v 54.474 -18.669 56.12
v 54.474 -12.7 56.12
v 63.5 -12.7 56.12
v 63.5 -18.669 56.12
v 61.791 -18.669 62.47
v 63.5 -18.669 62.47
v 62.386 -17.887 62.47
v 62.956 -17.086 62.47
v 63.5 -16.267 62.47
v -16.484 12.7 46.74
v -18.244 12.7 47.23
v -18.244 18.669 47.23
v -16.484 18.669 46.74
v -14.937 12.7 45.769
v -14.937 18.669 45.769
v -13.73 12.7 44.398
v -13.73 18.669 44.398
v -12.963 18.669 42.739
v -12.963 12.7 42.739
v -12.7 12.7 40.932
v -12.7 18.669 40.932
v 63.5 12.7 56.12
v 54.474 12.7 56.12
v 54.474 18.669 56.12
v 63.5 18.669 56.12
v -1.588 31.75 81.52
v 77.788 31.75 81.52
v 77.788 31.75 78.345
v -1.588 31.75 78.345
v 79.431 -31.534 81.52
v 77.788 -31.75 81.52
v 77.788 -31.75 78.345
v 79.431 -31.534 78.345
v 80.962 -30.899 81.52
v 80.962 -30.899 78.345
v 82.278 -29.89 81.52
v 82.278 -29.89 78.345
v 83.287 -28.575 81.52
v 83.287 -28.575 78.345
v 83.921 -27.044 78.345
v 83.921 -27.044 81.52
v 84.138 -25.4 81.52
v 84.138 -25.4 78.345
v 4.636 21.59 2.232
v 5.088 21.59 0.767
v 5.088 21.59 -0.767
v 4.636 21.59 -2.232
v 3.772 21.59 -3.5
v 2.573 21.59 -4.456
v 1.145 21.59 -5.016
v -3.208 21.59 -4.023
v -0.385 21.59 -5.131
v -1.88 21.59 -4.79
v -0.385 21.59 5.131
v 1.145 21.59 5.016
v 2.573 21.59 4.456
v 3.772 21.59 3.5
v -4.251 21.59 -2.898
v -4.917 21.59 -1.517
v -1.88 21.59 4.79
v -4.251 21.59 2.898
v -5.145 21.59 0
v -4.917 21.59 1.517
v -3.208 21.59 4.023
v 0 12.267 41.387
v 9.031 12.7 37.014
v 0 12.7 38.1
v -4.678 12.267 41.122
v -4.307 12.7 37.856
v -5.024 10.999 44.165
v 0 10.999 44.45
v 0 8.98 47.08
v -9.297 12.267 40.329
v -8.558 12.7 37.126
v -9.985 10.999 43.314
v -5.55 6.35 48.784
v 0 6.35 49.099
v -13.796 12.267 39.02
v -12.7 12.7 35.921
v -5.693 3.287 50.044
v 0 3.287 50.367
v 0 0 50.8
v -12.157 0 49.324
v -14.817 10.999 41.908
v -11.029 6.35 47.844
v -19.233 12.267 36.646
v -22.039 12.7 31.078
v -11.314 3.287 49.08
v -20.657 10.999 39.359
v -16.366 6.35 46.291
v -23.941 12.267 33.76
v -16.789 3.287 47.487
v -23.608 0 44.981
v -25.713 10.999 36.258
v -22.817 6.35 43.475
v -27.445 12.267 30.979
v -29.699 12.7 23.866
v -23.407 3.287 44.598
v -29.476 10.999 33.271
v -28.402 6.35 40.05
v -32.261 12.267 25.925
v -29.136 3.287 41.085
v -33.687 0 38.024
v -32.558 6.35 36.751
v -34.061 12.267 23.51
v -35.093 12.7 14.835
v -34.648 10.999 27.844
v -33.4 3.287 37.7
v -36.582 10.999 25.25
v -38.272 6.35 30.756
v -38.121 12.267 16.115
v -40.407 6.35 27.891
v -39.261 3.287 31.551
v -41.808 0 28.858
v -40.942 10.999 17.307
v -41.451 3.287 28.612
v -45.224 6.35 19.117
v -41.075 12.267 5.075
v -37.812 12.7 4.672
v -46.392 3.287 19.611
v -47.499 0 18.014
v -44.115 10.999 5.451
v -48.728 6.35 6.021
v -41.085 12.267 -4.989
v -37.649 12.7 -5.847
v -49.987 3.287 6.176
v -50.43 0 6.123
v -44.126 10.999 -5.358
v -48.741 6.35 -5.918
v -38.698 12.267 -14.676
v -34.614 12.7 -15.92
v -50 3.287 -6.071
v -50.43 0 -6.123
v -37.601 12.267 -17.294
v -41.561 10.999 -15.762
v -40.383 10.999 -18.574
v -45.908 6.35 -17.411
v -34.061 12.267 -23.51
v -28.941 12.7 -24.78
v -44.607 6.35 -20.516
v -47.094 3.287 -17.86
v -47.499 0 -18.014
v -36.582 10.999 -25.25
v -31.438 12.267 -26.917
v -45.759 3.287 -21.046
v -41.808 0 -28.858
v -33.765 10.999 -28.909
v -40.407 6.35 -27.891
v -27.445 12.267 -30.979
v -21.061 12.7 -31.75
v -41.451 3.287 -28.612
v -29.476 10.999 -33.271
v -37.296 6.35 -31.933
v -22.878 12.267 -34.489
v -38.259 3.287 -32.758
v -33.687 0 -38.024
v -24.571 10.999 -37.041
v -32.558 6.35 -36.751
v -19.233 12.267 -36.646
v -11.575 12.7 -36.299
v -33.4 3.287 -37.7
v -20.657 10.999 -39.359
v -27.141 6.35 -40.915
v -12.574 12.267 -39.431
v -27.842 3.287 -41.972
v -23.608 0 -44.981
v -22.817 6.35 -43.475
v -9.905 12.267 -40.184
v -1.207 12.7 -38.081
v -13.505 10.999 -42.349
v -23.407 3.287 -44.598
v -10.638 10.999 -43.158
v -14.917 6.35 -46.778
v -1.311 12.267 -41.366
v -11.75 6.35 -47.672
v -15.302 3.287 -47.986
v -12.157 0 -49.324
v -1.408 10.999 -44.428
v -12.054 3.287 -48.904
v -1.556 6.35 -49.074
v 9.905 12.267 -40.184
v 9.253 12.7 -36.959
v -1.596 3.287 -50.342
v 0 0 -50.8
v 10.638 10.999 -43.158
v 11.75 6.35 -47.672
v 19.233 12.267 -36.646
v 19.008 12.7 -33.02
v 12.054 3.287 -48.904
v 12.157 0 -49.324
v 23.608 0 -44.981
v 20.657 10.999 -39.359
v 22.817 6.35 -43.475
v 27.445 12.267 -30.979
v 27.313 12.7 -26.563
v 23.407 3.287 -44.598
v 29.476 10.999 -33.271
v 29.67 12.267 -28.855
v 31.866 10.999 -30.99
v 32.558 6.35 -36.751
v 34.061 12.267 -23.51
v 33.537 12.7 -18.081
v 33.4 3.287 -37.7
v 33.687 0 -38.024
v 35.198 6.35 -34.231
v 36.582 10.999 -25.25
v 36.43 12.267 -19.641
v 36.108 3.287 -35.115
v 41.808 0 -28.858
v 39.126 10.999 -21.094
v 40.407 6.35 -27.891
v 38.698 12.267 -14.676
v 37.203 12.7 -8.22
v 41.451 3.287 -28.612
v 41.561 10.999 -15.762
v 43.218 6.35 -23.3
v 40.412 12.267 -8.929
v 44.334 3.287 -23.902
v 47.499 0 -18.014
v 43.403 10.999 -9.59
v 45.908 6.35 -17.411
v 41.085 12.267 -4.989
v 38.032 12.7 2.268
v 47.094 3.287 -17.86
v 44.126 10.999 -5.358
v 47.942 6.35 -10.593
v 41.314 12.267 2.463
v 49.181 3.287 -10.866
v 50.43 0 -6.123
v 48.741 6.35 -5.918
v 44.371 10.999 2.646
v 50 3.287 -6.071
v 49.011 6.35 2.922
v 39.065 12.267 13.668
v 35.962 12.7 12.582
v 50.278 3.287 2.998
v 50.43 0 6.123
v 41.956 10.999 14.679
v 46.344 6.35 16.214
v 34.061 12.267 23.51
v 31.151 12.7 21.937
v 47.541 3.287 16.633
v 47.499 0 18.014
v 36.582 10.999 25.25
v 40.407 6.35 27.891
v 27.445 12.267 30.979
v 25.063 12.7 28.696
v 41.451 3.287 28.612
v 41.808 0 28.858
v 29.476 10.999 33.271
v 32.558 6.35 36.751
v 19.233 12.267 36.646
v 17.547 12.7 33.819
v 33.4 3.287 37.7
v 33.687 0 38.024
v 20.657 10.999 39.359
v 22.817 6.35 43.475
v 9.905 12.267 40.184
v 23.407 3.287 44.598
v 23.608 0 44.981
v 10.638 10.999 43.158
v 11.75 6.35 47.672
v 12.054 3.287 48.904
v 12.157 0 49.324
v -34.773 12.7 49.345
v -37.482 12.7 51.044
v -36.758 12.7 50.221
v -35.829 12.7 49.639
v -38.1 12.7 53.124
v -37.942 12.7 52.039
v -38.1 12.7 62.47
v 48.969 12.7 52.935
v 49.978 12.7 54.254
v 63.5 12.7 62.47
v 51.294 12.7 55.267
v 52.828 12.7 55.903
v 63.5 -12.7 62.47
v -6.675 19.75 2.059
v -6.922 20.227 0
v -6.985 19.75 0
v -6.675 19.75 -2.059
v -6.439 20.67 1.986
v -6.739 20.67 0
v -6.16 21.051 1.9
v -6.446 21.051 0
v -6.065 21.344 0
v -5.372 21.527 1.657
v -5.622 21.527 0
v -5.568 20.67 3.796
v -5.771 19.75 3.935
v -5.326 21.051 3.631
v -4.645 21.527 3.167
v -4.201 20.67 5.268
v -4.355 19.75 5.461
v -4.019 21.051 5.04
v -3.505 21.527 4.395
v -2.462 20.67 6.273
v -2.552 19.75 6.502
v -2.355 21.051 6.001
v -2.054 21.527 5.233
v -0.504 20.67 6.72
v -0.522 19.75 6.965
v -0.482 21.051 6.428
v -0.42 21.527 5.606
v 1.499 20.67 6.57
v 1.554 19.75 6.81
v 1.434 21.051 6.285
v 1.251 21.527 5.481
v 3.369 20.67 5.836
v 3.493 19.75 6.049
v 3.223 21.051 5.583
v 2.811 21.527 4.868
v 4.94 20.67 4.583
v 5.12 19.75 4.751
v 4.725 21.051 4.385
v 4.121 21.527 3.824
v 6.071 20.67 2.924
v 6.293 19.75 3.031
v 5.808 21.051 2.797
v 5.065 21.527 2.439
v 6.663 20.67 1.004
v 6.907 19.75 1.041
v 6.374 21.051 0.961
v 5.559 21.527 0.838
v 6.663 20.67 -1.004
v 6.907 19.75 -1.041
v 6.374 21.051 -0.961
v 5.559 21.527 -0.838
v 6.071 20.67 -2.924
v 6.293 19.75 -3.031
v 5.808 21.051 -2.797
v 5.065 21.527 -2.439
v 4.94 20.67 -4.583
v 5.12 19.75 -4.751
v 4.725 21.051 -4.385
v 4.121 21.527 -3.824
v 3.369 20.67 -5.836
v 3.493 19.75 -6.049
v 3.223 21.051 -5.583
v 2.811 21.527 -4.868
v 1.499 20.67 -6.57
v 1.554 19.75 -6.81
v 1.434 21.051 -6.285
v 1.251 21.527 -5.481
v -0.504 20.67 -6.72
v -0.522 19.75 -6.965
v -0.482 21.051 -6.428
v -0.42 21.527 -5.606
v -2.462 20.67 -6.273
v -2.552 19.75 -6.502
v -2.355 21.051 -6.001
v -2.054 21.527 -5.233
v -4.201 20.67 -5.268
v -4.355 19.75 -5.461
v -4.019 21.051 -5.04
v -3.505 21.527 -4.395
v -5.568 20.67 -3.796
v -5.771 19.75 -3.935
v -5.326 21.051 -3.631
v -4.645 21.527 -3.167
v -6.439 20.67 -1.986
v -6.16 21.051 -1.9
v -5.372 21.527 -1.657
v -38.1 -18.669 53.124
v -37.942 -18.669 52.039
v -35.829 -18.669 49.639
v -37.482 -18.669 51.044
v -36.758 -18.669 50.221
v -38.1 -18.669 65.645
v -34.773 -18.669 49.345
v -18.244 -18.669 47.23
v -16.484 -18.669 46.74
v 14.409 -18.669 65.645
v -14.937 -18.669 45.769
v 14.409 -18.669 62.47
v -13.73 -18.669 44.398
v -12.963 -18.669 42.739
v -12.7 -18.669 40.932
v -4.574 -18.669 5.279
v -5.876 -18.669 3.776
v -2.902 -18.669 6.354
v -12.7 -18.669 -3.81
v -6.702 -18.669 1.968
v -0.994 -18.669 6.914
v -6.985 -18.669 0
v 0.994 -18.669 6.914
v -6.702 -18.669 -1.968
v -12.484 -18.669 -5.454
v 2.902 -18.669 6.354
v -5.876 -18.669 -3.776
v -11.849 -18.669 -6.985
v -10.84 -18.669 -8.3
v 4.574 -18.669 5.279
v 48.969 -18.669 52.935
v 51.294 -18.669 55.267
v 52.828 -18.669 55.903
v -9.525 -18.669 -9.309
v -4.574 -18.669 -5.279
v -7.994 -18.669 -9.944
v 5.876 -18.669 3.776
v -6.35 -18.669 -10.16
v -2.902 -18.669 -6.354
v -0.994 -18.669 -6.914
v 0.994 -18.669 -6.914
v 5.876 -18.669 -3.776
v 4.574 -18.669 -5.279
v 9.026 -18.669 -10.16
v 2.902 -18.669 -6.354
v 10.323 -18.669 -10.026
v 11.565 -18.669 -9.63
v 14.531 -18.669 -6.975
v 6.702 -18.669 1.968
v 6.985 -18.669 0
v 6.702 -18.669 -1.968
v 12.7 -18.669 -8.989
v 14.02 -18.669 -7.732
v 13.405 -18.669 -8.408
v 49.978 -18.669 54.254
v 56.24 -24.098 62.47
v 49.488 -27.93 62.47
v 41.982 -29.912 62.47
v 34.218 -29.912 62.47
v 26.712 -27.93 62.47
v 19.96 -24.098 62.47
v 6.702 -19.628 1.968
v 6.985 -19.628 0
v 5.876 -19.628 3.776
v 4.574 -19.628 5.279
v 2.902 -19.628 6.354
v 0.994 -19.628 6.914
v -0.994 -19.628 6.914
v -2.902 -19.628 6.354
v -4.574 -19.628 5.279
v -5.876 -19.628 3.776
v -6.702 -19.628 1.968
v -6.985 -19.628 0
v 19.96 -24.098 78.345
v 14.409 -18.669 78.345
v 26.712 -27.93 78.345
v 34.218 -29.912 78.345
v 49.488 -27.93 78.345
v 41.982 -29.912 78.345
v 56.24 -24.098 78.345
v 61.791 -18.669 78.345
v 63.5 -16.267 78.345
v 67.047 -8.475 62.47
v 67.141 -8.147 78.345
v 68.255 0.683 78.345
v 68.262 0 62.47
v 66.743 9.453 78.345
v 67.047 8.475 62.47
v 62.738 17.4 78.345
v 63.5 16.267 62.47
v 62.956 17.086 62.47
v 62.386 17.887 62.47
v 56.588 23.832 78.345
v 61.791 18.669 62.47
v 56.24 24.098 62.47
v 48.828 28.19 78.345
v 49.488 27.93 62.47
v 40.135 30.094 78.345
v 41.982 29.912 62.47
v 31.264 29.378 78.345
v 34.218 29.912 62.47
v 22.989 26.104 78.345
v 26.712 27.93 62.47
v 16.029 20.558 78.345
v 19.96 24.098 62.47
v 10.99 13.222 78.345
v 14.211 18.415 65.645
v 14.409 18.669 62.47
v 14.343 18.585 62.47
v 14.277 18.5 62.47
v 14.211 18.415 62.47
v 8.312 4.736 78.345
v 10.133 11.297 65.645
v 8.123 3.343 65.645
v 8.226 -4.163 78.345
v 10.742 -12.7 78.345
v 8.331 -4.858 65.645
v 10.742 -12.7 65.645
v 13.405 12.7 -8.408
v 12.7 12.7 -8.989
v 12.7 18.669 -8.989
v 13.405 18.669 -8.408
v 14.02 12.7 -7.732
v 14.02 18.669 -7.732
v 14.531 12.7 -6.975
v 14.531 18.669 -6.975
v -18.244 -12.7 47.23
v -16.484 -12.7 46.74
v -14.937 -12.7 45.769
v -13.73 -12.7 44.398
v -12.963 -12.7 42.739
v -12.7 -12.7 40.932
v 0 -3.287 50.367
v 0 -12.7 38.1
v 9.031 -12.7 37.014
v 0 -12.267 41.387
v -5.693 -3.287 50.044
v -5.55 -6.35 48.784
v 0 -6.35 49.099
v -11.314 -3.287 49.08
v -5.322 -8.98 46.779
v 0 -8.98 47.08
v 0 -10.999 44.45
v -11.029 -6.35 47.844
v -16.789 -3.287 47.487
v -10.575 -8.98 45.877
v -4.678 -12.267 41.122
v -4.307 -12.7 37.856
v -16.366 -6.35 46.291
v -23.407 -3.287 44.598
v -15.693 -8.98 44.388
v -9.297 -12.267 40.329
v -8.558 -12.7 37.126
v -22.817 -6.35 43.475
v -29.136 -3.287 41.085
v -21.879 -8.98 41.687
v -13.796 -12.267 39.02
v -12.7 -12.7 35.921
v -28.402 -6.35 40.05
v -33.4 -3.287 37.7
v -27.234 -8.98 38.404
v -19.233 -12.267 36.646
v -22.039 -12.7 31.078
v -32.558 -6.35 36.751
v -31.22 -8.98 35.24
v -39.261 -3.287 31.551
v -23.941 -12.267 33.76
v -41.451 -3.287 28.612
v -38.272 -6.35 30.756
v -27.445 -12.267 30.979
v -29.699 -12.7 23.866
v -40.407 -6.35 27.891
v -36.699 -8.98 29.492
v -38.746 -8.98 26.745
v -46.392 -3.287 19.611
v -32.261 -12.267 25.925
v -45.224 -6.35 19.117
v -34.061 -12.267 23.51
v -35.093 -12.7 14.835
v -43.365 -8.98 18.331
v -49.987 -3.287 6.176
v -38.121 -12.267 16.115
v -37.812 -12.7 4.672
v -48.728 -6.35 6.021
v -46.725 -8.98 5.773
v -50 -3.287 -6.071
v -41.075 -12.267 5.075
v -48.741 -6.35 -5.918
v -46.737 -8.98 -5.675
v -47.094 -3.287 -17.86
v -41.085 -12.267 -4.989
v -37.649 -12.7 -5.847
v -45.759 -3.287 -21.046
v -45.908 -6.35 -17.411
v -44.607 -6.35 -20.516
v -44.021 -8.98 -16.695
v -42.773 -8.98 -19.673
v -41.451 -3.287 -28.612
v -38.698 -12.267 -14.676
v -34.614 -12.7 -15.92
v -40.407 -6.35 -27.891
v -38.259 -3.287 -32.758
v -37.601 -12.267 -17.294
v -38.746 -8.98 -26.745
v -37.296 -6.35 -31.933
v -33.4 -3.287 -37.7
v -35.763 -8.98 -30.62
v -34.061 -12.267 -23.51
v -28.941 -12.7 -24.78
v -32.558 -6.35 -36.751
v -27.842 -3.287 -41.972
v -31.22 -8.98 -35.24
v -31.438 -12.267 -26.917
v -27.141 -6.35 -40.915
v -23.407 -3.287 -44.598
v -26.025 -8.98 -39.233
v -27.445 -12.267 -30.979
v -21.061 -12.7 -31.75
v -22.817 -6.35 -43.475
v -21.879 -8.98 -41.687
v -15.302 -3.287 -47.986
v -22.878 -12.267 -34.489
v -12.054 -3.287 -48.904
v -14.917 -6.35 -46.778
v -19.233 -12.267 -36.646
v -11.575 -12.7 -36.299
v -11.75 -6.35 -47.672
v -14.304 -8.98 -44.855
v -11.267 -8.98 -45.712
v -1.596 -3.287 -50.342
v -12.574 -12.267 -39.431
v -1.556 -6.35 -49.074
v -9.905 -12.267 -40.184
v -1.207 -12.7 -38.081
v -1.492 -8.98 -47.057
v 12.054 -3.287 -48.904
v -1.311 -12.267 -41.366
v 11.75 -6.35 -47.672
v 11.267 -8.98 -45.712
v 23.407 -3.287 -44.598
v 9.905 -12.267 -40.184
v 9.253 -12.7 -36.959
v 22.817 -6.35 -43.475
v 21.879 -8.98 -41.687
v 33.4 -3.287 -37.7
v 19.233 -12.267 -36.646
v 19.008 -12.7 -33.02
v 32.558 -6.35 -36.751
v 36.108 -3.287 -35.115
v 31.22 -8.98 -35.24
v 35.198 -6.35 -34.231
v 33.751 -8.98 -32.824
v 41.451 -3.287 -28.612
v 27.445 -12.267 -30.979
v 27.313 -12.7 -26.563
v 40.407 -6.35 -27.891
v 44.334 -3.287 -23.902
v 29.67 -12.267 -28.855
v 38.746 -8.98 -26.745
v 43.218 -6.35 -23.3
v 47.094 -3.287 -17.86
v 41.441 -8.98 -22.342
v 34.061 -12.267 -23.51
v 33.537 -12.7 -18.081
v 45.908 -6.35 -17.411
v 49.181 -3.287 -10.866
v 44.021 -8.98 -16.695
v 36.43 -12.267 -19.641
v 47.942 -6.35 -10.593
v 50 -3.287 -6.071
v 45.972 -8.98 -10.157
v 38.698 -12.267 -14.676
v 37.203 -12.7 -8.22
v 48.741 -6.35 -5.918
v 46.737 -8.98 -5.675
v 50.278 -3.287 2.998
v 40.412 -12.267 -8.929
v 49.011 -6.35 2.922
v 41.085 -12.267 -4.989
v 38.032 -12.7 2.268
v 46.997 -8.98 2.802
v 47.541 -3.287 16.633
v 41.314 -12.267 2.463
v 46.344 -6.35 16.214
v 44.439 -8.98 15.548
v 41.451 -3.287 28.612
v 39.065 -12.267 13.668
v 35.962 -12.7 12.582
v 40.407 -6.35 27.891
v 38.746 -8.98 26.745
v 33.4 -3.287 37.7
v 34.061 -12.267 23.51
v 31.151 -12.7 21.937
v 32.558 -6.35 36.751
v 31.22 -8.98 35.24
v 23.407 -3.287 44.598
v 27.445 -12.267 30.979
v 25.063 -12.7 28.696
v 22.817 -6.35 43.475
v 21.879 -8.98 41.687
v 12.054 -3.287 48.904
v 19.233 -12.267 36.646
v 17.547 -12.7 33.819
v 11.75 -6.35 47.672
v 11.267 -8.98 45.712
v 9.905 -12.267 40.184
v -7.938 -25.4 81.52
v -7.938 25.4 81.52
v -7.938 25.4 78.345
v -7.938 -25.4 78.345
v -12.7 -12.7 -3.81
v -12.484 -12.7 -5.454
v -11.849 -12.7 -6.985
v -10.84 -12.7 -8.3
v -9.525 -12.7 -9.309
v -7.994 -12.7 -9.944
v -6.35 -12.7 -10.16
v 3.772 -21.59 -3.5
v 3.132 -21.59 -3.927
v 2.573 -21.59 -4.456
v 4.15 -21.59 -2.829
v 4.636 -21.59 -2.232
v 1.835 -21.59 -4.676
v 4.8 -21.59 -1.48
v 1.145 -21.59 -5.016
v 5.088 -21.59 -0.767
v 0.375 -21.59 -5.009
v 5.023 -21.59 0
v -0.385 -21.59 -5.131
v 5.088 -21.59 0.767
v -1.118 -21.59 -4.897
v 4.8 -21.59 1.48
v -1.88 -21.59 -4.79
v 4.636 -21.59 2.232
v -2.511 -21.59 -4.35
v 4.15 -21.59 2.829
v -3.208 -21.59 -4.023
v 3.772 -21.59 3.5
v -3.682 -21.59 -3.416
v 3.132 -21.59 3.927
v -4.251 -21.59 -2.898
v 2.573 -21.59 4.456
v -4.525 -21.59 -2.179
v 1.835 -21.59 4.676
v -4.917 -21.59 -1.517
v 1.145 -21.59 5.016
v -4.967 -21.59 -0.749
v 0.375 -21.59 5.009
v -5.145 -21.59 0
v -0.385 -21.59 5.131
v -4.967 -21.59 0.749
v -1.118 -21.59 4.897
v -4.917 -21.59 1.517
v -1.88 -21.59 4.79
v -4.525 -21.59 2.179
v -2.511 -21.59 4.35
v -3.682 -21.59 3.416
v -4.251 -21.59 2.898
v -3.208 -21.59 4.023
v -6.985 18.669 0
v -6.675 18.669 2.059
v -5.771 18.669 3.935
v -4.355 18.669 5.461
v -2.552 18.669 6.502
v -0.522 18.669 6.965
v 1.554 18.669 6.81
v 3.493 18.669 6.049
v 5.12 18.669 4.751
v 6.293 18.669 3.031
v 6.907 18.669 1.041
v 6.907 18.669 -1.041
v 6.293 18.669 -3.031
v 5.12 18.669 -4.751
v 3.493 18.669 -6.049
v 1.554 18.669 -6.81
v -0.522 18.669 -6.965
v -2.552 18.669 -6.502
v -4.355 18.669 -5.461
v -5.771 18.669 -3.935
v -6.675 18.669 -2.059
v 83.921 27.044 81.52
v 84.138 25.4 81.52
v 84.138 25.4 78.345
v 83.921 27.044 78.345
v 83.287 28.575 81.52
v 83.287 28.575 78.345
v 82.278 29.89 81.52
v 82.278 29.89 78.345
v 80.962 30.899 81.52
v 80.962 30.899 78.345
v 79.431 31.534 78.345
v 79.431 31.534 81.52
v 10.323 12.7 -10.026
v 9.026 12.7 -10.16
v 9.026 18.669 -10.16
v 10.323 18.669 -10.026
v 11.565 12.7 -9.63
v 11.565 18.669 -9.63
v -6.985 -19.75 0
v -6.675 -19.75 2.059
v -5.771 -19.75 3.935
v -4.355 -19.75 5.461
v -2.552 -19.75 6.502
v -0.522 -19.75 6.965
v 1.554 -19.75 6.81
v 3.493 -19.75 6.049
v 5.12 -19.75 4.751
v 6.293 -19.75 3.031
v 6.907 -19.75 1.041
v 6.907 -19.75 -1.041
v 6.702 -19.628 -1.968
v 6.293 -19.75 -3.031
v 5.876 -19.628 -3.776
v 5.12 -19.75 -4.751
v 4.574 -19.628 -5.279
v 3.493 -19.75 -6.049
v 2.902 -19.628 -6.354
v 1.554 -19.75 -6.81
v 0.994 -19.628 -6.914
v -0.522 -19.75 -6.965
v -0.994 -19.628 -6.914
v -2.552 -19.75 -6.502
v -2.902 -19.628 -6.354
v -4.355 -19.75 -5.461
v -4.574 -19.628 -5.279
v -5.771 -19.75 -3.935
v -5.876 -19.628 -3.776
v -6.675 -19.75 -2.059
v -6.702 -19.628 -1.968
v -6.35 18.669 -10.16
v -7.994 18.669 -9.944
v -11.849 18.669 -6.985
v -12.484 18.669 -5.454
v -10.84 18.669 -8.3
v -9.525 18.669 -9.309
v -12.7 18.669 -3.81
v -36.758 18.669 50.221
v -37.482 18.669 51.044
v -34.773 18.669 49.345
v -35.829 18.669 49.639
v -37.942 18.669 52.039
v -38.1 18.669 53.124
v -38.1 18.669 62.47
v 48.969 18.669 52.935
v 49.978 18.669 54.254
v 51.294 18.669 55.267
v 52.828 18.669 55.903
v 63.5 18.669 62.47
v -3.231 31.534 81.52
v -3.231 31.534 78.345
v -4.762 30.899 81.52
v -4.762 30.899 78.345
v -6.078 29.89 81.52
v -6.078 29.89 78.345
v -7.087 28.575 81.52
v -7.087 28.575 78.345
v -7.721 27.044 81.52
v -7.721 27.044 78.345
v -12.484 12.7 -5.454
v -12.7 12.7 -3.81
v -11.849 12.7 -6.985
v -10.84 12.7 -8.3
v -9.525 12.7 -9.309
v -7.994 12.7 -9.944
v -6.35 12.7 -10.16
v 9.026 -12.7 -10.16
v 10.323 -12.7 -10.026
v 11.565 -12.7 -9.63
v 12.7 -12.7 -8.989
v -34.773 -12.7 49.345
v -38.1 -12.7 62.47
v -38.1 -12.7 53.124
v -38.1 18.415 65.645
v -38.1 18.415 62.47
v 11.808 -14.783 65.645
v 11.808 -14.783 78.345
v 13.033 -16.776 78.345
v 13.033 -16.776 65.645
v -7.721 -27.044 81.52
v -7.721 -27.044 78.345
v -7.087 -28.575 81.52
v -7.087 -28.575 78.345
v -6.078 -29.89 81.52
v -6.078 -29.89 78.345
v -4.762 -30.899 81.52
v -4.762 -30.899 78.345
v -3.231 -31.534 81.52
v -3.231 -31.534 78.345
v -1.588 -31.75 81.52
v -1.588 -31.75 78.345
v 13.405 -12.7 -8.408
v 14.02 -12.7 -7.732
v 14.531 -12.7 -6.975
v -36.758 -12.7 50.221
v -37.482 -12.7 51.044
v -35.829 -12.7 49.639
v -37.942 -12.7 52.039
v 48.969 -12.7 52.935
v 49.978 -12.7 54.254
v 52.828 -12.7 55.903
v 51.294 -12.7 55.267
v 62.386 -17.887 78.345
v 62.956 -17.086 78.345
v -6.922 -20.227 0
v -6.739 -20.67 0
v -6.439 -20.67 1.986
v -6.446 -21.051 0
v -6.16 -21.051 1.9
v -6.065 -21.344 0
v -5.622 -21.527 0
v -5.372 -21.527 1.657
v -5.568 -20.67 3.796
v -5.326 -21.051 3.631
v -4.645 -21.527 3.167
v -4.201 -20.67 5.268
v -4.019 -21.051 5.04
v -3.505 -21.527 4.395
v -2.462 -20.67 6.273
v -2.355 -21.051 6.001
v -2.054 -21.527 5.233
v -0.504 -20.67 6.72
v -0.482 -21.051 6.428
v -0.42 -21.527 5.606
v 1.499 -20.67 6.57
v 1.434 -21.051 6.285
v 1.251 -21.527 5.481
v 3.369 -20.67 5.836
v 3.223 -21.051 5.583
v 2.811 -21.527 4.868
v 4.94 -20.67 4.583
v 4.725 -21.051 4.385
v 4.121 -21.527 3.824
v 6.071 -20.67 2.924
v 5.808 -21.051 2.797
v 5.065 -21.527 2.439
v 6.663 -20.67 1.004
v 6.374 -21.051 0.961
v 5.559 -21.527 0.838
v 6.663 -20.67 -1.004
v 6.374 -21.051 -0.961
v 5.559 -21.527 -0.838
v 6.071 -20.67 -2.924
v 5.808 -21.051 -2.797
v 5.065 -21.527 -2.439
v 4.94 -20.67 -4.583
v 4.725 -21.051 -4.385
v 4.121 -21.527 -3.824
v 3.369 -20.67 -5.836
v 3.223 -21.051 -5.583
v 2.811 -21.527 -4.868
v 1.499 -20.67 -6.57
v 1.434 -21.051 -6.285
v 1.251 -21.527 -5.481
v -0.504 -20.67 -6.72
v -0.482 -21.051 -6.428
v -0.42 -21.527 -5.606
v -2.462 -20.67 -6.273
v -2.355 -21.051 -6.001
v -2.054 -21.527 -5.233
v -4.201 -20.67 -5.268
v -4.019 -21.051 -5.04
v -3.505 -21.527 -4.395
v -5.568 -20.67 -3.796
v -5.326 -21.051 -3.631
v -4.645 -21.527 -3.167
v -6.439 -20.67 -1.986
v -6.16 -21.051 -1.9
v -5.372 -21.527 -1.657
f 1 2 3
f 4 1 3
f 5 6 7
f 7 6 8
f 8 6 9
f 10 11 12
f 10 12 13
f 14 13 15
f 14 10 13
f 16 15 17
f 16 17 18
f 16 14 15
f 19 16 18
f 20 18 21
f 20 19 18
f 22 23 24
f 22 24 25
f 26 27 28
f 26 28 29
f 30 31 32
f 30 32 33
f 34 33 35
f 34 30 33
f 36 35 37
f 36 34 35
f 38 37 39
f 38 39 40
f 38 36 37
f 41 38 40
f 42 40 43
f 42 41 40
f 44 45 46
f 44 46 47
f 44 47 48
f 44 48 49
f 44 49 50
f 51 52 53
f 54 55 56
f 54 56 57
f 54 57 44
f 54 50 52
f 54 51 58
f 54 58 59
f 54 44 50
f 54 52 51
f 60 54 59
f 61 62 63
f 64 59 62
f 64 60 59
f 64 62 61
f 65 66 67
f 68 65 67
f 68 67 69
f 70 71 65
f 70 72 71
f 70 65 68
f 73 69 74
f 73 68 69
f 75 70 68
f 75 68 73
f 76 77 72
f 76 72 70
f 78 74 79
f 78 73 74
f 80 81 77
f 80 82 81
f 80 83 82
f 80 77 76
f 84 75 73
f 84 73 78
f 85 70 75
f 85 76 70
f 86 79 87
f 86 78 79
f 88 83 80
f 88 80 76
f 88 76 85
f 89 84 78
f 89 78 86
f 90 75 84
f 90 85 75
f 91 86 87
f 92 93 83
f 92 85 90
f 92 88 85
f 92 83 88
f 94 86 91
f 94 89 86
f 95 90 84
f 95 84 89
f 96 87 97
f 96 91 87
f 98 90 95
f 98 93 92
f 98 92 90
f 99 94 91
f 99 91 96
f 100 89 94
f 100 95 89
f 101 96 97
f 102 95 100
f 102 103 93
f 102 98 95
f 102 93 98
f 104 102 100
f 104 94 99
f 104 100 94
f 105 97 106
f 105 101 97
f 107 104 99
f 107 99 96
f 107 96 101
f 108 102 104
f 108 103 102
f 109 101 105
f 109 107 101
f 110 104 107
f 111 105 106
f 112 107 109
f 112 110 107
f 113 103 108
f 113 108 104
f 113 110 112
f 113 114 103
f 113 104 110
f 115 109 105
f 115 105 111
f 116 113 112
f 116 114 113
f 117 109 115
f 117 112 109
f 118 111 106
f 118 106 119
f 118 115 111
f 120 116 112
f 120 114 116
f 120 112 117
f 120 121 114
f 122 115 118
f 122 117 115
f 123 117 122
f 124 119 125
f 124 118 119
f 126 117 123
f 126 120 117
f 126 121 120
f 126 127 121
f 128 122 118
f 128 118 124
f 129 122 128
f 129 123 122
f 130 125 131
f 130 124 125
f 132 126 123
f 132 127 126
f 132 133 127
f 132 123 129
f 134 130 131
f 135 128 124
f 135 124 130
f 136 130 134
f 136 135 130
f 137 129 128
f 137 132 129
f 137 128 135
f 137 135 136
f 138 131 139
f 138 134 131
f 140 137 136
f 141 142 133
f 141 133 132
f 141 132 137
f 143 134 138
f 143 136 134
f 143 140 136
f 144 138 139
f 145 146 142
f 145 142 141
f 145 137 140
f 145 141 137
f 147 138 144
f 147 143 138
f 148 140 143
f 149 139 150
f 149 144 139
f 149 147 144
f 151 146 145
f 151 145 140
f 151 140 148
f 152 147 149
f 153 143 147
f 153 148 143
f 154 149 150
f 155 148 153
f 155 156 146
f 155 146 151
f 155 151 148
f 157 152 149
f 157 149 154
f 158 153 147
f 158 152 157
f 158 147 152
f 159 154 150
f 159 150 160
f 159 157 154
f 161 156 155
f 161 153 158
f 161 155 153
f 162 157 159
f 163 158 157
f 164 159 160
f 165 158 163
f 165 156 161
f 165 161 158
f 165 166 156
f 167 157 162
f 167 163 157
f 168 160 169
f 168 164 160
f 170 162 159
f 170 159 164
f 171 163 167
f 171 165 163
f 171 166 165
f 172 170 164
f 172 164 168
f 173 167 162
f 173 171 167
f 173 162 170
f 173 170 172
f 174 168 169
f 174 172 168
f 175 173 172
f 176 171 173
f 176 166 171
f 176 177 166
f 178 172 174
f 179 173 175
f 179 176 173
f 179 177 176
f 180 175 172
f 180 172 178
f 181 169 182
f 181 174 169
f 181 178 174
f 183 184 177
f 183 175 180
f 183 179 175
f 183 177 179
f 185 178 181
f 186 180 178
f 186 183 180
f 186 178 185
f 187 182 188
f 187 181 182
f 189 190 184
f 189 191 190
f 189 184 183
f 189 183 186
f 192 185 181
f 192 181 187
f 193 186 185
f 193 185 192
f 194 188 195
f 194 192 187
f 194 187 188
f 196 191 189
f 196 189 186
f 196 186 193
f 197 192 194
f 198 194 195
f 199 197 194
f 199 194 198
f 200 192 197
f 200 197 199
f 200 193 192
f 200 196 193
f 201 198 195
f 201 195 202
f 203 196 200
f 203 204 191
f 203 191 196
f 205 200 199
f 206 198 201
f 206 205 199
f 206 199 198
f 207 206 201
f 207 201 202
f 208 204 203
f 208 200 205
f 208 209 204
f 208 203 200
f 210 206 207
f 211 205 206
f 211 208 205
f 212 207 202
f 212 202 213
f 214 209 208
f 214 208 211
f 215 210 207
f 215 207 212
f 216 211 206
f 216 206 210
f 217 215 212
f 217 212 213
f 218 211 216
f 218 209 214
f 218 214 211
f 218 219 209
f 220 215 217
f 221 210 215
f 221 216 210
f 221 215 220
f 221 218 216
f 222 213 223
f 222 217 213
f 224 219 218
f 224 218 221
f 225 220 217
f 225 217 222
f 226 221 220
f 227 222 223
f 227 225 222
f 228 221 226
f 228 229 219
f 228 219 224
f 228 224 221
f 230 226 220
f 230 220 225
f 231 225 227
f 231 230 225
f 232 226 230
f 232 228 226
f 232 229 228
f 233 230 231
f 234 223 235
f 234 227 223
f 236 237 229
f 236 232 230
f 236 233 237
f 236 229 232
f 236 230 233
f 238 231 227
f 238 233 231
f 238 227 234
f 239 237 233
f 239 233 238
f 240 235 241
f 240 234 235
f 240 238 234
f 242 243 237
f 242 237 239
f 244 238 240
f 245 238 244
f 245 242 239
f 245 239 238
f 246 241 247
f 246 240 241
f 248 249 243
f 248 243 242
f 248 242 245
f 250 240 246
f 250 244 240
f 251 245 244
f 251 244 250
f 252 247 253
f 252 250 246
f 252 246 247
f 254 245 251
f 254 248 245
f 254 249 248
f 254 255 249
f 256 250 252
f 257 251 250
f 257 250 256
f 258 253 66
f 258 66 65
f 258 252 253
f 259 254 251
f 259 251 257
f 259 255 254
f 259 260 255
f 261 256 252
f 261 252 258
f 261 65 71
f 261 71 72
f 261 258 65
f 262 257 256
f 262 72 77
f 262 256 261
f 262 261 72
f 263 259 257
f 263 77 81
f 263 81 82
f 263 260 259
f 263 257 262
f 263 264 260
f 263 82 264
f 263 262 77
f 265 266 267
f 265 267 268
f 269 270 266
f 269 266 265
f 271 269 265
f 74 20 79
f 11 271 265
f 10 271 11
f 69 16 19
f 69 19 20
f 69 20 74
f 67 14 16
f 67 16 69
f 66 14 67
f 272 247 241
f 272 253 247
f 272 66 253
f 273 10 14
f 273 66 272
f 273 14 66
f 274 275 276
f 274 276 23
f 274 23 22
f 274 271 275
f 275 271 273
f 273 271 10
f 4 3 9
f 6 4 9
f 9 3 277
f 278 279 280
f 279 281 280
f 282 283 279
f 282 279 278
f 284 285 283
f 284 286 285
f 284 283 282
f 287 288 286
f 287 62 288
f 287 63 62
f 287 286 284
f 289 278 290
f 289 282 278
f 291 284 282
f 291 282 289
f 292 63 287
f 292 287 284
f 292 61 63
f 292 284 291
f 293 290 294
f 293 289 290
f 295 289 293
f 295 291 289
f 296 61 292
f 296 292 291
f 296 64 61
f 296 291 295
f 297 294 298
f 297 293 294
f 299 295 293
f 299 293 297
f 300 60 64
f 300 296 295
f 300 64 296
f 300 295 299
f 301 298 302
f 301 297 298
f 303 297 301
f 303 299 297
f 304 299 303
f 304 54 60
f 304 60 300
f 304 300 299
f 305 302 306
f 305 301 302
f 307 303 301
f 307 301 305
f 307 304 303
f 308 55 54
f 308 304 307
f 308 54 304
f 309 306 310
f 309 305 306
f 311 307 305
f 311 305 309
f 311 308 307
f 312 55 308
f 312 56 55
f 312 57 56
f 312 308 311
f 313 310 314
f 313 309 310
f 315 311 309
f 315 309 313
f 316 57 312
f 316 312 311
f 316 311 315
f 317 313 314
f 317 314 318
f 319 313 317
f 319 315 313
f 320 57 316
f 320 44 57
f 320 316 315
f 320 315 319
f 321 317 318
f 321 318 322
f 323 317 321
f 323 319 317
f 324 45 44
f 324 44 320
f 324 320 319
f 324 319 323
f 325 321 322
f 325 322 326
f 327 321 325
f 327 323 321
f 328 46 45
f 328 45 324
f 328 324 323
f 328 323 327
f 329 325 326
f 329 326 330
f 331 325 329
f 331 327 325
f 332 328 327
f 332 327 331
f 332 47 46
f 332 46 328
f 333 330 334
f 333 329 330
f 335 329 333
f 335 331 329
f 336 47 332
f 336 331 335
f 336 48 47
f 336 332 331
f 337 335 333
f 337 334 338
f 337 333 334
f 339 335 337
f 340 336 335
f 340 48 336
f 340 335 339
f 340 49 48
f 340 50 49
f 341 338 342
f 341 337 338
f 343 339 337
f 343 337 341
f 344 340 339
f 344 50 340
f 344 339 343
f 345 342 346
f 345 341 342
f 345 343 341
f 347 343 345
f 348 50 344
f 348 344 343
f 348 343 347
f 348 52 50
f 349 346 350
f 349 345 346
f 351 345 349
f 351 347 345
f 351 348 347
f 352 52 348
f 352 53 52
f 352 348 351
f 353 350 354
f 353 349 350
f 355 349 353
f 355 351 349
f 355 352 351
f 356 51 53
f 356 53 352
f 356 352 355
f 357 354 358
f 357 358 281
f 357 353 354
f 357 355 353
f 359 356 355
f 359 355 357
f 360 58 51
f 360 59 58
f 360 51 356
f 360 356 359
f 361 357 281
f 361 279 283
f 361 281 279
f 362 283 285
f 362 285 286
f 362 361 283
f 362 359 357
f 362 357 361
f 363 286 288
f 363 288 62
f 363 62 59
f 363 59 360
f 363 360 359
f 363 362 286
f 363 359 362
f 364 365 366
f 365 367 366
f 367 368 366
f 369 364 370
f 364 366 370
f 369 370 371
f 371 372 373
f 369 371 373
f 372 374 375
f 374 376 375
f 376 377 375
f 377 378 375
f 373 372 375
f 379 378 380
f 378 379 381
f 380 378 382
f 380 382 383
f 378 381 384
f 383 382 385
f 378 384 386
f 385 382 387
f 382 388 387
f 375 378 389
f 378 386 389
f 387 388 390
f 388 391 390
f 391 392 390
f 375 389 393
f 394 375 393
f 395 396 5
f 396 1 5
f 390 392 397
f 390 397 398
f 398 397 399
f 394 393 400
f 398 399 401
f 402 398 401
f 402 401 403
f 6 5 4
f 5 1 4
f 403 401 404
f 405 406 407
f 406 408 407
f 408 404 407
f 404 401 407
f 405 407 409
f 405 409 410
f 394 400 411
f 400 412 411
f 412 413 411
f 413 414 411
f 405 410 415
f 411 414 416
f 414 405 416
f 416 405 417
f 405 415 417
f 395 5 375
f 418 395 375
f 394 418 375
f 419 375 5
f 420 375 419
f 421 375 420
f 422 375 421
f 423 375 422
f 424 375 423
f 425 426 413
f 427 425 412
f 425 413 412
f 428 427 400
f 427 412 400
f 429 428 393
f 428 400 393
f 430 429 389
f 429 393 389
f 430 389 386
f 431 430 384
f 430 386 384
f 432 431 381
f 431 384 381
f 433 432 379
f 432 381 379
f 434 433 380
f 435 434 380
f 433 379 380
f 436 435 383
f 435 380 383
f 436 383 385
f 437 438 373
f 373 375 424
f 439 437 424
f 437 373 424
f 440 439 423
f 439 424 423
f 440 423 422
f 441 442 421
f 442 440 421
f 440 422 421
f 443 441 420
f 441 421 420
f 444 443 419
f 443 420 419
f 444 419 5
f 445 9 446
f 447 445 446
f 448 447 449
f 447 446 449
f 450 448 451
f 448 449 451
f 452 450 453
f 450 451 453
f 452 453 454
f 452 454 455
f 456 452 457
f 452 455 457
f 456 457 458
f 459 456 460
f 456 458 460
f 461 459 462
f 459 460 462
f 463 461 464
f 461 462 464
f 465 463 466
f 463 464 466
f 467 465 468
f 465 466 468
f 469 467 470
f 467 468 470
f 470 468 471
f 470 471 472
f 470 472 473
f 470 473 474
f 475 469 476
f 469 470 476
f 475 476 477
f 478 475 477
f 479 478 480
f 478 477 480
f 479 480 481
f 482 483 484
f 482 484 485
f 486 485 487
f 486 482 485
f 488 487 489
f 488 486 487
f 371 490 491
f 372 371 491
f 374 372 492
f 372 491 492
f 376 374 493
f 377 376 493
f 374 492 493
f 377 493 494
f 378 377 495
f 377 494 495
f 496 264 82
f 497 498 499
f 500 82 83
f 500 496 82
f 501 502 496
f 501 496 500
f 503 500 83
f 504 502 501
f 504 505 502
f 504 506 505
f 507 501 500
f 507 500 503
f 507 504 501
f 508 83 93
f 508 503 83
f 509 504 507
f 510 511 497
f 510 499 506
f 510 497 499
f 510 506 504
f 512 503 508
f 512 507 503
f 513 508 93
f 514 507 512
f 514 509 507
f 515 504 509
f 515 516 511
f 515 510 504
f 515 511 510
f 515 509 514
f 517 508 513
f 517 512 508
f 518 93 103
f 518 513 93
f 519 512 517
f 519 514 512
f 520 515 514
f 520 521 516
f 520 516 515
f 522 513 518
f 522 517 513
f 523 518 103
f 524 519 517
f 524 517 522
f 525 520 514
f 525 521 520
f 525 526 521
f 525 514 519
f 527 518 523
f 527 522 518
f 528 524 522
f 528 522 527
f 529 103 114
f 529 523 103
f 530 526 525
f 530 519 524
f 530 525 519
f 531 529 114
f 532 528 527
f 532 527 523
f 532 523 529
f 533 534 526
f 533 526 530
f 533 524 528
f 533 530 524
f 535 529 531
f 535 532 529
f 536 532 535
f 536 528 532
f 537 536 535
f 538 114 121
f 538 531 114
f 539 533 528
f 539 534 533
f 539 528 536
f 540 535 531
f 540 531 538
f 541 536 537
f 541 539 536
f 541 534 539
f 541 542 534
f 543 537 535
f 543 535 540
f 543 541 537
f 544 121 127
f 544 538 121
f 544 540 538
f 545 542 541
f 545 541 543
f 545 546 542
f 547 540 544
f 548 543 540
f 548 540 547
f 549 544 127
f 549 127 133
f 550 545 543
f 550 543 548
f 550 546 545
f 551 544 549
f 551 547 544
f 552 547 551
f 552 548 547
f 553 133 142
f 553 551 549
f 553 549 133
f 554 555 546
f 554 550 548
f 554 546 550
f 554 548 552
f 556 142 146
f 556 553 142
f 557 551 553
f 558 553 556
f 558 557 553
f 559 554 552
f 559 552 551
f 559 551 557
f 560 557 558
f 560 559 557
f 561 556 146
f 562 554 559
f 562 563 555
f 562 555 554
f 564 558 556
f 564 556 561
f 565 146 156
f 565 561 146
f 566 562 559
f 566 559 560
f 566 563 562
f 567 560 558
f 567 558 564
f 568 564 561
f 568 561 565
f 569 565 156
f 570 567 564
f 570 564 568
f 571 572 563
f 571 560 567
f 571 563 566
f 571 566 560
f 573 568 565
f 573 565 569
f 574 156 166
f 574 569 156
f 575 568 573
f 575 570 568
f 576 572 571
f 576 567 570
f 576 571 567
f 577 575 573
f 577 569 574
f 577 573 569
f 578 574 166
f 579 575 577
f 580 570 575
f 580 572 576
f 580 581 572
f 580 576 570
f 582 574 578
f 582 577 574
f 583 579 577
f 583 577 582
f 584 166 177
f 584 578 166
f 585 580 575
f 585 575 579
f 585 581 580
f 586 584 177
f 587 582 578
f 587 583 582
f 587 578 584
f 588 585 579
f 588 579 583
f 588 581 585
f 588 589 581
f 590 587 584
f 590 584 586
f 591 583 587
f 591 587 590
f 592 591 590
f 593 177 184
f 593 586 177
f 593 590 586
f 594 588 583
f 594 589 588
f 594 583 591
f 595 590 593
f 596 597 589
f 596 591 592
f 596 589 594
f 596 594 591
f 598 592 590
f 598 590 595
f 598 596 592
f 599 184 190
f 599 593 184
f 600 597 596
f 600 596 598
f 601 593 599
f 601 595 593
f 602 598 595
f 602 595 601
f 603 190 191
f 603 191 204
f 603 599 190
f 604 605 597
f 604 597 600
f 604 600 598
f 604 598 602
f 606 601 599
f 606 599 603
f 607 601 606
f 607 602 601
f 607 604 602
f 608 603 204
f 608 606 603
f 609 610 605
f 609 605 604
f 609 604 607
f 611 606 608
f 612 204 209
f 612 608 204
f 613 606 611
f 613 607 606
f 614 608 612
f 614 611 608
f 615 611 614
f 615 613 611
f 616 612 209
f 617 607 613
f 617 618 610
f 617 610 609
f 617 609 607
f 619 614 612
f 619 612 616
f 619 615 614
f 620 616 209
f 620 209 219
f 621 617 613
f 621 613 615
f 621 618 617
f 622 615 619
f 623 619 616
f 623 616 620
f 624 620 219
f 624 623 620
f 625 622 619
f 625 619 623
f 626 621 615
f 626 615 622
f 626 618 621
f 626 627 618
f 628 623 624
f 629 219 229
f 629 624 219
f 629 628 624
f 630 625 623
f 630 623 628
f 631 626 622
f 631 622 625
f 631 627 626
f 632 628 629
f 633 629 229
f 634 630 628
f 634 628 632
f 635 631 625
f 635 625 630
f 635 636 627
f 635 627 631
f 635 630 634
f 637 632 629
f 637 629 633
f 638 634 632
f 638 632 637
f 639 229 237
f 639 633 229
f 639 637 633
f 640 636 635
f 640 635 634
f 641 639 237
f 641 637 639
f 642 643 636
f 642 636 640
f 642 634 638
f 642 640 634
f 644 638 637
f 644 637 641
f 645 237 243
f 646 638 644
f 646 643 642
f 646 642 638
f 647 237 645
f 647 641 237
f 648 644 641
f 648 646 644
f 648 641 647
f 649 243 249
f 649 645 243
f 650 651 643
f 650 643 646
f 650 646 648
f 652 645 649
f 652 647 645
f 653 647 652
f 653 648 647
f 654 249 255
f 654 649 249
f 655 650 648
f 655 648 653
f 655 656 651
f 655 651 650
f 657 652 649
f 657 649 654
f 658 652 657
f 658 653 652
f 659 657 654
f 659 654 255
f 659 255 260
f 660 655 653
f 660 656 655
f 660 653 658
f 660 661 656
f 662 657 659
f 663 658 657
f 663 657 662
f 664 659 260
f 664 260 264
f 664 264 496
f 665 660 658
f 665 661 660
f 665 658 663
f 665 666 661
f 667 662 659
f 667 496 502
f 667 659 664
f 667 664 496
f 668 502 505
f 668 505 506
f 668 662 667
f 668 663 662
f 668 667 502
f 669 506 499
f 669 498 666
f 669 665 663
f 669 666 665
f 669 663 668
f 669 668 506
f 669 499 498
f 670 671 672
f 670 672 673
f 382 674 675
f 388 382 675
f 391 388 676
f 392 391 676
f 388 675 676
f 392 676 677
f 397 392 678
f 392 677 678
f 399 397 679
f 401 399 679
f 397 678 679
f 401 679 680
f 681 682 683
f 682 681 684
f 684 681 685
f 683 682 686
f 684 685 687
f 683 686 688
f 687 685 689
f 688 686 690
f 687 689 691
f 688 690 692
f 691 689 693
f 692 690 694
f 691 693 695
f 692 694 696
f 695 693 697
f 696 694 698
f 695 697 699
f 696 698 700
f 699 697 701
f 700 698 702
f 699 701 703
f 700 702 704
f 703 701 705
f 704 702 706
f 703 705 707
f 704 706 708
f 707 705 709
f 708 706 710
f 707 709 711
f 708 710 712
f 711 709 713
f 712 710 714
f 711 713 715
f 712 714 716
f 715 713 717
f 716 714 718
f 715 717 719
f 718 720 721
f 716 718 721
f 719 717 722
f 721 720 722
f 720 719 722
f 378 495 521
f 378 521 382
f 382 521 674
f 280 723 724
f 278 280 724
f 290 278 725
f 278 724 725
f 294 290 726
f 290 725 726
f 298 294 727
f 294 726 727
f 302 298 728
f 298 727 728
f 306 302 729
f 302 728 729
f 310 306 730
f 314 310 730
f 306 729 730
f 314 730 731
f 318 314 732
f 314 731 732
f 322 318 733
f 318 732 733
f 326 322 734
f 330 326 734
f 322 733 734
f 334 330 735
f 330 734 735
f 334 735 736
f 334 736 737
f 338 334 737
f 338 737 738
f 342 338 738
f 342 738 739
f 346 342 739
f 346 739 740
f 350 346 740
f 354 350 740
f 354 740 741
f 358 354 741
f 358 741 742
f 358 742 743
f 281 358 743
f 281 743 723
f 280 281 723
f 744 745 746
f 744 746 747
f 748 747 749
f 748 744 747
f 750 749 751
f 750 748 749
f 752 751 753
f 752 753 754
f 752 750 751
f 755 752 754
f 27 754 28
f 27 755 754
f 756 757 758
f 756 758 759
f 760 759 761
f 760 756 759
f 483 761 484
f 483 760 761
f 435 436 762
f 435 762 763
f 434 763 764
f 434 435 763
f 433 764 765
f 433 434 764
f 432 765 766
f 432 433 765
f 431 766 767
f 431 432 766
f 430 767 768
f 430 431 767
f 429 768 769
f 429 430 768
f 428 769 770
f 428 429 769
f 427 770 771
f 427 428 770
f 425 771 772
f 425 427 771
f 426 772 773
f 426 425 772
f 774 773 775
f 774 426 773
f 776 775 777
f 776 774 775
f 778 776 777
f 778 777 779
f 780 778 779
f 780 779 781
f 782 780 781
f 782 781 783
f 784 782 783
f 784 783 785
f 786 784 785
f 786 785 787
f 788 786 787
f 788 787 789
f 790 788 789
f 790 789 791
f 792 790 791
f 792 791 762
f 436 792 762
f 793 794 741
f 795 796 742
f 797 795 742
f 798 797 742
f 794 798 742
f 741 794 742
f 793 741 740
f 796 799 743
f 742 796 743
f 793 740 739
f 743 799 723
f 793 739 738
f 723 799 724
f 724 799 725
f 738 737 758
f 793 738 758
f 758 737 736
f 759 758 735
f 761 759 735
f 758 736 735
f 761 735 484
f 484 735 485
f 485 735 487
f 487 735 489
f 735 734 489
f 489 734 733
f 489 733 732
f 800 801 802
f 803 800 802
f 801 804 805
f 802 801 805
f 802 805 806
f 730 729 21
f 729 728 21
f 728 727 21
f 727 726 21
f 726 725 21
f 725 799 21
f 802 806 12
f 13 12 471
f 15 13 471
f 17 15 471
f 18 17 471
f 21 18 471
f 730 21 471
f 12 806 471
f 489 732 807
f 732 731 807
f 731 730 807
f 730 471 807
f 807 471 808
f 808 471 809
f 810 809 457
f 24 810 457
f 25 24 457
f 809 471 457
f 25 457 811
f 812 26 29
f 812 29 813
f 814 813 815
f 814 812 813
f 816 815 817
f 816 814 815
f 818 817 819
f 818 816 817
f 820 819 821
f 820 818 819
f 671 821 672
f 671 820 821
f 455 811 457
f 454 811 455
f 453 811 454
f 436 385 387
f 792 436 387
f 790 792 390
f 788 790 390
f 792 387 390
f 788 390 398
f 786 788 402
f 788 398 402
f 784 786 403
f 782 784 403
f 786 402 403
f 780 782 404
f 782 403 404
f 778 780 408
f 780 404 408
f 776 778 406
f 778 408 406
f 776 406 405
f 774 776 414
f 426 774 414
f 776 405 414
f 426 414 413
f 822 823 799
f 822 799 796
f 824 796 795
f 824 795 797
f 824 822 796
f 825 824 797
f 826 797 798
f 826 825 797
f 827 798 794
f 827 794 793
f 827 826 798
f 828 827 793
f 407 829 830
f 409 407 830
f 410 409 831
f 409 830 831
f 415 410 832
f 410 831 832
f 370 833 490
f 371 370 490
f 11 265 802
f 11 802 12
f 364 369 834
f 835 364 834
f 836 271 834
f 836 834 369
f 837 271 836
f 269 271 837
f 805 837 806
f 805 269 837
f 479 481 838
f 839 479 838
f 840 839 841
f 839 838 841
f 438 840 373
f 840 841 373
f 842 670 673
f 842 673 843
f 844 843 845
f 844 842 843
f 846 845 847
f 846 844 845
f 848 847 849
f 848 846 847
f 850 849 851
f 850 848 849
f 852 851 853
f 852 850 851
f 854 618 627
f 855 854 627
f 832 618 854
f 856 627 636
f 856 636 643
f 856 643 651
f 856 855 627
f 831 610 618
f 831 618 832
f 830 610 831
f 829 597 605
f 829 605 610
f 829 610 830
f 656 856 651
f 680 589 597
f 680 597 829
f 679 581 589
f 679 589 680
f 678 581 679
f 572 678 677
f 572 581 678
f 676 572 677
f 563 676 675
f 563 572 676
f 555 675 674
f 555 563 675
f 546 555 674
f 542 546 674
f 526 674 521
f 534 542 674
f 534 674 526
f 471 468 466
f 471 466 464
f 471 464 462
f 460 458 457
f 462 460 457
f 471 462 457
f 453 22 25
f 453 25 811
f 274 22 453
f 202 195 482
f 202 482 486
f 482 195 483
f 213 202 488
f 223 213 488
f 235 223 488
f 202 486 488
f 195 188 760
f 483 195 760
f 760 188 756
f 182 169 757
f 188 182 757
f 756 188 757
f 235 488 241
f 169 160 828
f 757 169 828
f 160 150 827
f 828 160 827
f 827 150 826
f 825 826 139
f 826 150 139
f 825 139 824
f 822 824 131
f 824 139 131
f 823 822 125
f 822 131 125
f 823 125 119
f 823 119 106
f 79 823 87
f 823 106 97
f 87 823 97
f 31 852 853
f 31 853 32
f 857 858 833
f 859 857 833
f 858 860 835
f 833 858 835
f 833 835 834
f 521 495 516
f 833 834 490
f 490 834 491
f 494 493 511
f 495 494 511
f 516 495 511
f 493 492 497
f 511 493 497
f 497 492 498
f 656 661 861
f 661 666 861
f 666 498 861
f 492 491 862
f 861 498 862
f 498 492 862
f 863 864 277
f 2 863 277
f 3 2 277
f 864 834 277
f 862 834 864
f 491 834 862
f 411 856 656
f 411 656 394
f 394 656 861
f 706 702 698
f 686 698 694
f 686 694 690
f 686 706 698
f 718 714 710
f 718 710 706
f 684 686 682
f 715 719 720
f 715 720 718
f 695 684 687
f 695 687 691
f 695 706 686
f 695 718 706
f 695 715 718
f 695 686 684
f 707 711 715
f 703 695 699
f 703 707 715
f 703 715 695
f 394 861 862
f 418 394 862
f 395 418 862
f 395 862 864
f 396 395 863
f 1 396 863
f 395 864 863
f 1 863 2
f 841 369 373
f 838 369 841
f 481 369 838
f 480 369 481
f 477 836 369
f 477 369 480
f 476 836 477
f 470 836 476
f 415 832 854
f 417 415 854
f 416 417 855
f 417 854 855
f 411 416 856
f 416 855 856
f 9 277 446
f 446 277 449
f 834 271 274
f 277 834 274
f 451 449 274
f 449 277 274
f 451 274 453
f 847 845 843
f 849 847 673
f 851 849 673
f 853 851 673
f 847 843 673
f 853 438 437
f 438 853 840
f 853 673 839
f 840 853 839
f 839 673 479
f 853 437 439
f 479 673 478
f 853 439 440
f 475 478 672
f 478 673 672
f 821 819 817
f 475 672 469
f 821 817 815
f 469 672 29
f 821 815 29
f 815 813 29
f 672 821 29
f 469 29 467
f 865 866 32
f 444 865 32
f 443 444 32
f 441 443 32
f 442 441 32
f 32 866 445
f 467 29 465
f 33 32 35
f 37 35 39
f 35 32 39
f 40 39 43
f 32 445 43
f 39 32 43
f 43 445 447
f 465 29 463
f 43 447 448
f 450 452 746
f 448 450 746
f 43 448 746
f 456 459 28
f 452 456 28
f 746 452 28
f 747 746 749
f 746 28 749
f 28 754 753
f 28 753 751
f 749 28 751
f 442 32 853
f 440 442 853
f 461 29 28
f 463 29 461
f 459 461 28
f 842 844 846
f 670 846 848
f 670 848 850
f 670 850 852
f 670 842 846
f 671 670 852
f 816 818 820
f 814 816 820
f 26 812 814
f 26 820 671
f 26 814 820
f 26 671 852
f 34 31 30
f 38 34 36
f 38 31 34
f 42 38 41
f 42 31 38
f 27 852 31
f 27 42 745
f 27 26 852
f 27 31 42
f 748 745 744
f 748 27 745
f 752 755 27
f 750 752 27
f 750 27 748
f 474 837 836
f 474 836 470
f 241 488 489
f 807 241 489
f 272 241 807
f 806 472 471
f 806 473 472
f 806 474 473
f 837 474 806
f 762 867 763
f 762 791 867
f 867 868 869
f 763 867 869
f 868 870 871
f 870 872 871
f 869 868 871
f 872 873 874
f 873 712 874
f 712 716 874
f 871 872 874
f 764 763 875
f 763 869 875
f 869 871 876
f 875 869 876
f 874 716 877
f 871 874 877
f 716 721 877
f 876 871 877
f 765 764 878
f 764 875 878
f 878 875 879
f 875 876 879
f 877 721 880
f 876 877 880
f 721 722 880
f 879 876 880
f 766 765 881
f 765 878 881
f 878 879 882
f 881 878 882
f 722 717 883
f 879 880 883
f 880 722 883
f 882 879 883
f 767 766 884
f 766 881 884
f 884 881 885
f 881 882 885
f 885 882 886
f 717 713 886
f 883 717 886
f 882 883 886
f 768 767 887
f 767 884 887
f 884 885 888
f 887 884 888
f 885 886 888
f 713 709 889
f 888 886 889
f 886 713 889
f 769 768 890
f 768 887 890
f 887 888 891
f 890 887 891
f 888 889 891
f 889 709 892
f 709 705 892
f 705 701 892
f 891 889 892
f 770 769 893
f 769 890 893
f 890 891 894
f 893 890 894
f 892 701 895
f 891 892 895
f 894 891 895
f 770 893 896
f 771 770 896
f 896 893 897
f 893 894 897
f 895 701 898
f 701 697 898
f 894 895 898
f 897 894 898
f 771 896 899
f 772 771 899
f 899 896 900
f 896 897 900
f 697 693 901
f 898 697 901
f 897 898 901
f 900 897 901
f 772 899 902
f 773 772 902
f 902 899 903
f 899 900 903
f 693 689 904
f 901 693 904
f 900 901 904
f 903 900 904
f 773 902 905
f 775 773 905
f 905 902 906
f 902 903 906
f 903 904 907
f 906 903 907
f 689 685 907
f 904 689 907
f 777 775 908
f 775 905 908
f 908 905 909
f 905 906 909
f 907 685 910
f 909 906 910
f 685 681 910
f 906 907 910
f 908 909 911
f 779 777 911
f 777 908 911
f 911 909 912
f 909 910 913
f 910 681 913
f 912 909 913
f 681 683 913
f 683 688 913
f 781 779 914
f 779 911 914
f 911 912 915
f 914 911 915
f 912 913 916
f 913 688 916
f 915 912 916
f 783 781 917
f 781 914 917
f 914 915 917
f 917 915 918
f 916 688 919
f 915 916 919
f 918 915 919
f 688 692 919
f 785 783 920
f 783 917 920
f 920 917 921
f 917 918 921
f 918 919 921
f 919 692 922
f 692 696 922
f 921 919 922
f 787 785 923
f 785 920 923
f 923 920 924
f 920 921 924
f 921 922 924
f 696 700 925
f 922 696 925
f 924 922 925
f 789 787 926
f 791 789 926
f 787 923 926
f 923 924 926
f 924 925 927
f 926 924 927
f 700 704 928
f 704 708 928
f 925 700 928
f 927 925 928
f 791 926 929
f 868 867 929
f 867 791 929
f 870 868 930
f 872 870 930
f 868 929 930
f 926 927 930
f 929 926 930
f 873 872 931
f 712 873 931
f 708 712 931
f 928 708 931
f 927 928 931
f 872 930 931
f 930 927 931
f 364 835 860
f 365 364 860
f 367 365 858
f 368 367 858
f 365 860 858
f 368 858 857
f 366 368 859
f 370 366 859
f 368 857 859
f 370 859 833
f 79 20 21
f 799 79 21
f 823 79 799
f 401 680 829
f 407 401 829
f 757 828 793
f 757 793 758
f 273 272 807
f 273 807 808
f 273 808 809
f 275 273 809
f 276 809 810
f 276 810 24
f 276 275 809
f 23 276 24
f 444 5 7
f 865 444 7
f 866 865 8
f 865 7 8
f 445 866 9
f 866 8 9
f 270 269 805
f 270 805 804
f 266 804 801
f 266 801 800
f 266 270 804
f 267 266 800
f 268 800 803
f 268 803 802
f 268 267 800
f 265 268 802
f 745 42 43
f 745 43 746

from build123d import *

# Parameters (mm, degrees)
F2_R      = 6.985
F3_DEPTH  = 8.89
F4_R      = 1.9622727835
F5_R      = 6.985
F6_DEPTH  = 8.89
F7_R      = 1.8396307345
F9_DEPTH  = 5.969
F12_DEPTH = 19.05
F14_DEPTH = 3.175
F15_W     = 57.15
F15_H     = 37.084
F16_DEPTH = 3.175


with BuildPart() as f1:
    # F0 (on Right) → F1 (revolve)
    with BuildSketch(Plane.YZ):
        with BuildLine():
            Line((-12.7, 0), (0, 0))
            Line((0, 0), (0, 50.8))
            ThreePointArc((0, 50.8), (-8.9802561211, 47.0802561211), (-12.7, 38.1))
            Line((-12.7, 38.1), (-12.7, 0))
        make_face()
        with BuildLine():
            Line((0, 50.8), (0, 0))
            Line((0, 0), (12.7, 0))
            Line((12.7, 0), (12.7, 38.1))
            ThreePointArc((12.7, 38.1), (8.9802561211, 47.0802561211), (0, 50.8))
        make_face()
    revolve(axis=Axis((0, -14.7607661784, 0), (0, -1, 0)))

    # F2 (on face) → F3 (join)
    with BuildSketch(Plane.XZ.offset(12.7)):
        Circle(F2_R)
    extrude(amount=F3_DEPTH)

    # F4
    f4_edges = [f1.edges().sort_by_distance(p)[0] for p in [
        (-6.985, -21.59, 0),
    ]]
    fillet(f4_edges, radius=F4_R)

    # F5 (on face) → F6 (join)
    with BuildSketch(Plane(origin=(0, 12.7, 0), x_dir=(-1, 0, 0), z_dir=(0, 1, 0))):
        Circle(F5_R)
    extrude(amount=F6_DEPTH)

    # F7
    f7_edges = [f1.edges().sort_by_distance(p)[0] for p in [
        (6.985, 21.59, 0),
    ]]
    fillet(f7_edges, radius=F7_R)

    # F8 (on face) → F9 (join)
    with BuildSketch(Plane.XZ.offset(12.7)):
        with BuildLine():
            Line((1.7471951485, 62.4704148293), (0, 62.4704148293))
            Line((0, 62.4704148293), (-12.7, 62.4704148293))
            Line((-12.7, 62.4704148293), (-38.1, 62.4704148293))
            Line((-38.1, 62.4704148293), (-38.1, 53.124037792))
            ThreePointArc((-38.1, 53.124037792), (-37.1499121134, 50.6066973892), (-34.7734893943, 49.3448397282))
            Line((-34.7734893943, 49.3448397282), (-18.2441843429, 47.2301731899))
            ThreePointArc((-18.2441843429, 47.2301731899), (-14.2834798111, 45.1270770883), (-12.7, 40.9315097502))
            Line((-12.7, 40.9315097502), (-12.7, 0))
            Line((-12.7, 0), (-12.7, -3.81))
            ThreePointArc((-12.7, -3.81), (-10.8401280605, -8.3001280605), (-6.35, -10.16))
            Line((-6.35, -10.16), (9.0258122236, -10.16))
            ThreePointArc((9.0258122236, -10.16), (10.9539405401, -9.8601918313), (12.7, -8.9890775418))
            Line((12.7, -8.9890775418), (12.7, 0))
            Line((12.7, 0), (12.7, 62.4704148293))
            Line((12.7, 62.4704148293), (1.7471951485, 62.4704148293))
        make_face()
        with BuildLine():
            Line((63.5, 62.4704148293), (12.7, 62.4704148293))
            Line((12.7, 62.4704148293), (12.7, 0))
            Line((12.7, 0), (12.7, -8.9890775418))
            ThreePointArc((12.7, -8.9890775418), (13.7247586768, -8.0811125283), (14.531070583, -6.9745900834))
            Line((14.531070583, -6.9745900834), (48.968929417, 52.9350049127))
            ThreePointArc((48.968929417, 52.9350049127), (51.2939870776, 55.2666702377), (54.4741877764, 56.1204148293))
            Line((54.4741877764, 56.1204148293), (63.5, 56.1204148293))
            Line((63.5, 56.1204148293), (63.5, 62.4704148293))
        make_face()
    extrude(amount=F9_DEPTH)


with BuildPart() as f10_1:
    # F10: instance of F1
    add(f1.part.mirror(Plane.XZ))


with BuildPart() as f12:
    # F11 (on face) → F12 (new body)
    with BuildSketch(Plane.XY.offset(62.4704148293)):
        with BuildLine():
            ThreePointArc((63.5, -16.267034341), (67.0473997645, -8.4749308625), (68.2625, 0))
            ThreePointArc((68.2625, 0), (31.597067385, 29.453153883), (10.7415203959, -12.7))
            Line((10.7415203959, -12.7), (63.5, -12.7))
            Line((63.5, -12.7), (63.5, -16.267034341))
        make_face()
        with BuildLine():
            Line((63.5, -12.7), (10.7415203959, -12.7))
            ThreePointArc((10.7415203959, -12.7), (12.4015653576, -15.7913540642), (14.4093933119, -18.669))
            Line((14.4093933119, -18.669), (61.7906066881, -18.669))
            ThreePointArc((61.7906066881, -18.669), (62.6746673631, -17.4889144958), (63.5, -16.267034341))
            Line((63.5, -16.267034341), (63.5, -12.7))
        make_face()
        with BuildLine():
            Line((61.7906066881, -18.669), (14.4093933119, -18.669))
            ThreePointArc((14.4093933119, -18.669), (38.1, -30.1625), (61.7906066881, -18.669))
        make_face()
    extrude(amount=F12_DEPTH)

    # F13 (on face) → F14 (join)
    with BuildSketch(Plane.XY.offset(81.5204148293)):
        with BuildLine():
            Line((-1.5875, -31.75), (77.7875, -31.75))
            ThreePointArc((77.7875, -31.75), (82.2776280605, -29.8901280605), (84.1375, -25.4))
            Line((84.1375, -25.4), (84.1375, 25.4))
            ThreePointArc((84.1375, 25.4), (82.2776280605, 29.8901280605), (77.7875, 31.75))
            Line((77.7875, 31.75), (-1.5875, 31.75))
            ThreePointArc((-1.5875, 31.75), (-6.0776280605, 29.8901280605), (-7.9375, 25.4))
            Line((-7.9375, 25.4), (-7.9375, -25.4))
            ThreePointArc((-7.9375, -25.4), (-6.0776280605, -29.8901280605), (-1.5875, -31.75))
        make_face()
    extrude(amount=-F14_DEPTH)


with BuildPart() as f1_1:
    add(f1.part)

    add(f10_1.part)  # F16 merges F10_1

    add(f12.part)  # F16 merges F12
    # F15 (on face) → F16 (join)
    with BuildSketch(Plane.XY.offset(62.4704148293)):
        with Locations((-9.525, -0.127)):
            Rectangle(F15_W, F15_H)
    extrude(amount=F16_DEPTH)


solid = f1_1.part
